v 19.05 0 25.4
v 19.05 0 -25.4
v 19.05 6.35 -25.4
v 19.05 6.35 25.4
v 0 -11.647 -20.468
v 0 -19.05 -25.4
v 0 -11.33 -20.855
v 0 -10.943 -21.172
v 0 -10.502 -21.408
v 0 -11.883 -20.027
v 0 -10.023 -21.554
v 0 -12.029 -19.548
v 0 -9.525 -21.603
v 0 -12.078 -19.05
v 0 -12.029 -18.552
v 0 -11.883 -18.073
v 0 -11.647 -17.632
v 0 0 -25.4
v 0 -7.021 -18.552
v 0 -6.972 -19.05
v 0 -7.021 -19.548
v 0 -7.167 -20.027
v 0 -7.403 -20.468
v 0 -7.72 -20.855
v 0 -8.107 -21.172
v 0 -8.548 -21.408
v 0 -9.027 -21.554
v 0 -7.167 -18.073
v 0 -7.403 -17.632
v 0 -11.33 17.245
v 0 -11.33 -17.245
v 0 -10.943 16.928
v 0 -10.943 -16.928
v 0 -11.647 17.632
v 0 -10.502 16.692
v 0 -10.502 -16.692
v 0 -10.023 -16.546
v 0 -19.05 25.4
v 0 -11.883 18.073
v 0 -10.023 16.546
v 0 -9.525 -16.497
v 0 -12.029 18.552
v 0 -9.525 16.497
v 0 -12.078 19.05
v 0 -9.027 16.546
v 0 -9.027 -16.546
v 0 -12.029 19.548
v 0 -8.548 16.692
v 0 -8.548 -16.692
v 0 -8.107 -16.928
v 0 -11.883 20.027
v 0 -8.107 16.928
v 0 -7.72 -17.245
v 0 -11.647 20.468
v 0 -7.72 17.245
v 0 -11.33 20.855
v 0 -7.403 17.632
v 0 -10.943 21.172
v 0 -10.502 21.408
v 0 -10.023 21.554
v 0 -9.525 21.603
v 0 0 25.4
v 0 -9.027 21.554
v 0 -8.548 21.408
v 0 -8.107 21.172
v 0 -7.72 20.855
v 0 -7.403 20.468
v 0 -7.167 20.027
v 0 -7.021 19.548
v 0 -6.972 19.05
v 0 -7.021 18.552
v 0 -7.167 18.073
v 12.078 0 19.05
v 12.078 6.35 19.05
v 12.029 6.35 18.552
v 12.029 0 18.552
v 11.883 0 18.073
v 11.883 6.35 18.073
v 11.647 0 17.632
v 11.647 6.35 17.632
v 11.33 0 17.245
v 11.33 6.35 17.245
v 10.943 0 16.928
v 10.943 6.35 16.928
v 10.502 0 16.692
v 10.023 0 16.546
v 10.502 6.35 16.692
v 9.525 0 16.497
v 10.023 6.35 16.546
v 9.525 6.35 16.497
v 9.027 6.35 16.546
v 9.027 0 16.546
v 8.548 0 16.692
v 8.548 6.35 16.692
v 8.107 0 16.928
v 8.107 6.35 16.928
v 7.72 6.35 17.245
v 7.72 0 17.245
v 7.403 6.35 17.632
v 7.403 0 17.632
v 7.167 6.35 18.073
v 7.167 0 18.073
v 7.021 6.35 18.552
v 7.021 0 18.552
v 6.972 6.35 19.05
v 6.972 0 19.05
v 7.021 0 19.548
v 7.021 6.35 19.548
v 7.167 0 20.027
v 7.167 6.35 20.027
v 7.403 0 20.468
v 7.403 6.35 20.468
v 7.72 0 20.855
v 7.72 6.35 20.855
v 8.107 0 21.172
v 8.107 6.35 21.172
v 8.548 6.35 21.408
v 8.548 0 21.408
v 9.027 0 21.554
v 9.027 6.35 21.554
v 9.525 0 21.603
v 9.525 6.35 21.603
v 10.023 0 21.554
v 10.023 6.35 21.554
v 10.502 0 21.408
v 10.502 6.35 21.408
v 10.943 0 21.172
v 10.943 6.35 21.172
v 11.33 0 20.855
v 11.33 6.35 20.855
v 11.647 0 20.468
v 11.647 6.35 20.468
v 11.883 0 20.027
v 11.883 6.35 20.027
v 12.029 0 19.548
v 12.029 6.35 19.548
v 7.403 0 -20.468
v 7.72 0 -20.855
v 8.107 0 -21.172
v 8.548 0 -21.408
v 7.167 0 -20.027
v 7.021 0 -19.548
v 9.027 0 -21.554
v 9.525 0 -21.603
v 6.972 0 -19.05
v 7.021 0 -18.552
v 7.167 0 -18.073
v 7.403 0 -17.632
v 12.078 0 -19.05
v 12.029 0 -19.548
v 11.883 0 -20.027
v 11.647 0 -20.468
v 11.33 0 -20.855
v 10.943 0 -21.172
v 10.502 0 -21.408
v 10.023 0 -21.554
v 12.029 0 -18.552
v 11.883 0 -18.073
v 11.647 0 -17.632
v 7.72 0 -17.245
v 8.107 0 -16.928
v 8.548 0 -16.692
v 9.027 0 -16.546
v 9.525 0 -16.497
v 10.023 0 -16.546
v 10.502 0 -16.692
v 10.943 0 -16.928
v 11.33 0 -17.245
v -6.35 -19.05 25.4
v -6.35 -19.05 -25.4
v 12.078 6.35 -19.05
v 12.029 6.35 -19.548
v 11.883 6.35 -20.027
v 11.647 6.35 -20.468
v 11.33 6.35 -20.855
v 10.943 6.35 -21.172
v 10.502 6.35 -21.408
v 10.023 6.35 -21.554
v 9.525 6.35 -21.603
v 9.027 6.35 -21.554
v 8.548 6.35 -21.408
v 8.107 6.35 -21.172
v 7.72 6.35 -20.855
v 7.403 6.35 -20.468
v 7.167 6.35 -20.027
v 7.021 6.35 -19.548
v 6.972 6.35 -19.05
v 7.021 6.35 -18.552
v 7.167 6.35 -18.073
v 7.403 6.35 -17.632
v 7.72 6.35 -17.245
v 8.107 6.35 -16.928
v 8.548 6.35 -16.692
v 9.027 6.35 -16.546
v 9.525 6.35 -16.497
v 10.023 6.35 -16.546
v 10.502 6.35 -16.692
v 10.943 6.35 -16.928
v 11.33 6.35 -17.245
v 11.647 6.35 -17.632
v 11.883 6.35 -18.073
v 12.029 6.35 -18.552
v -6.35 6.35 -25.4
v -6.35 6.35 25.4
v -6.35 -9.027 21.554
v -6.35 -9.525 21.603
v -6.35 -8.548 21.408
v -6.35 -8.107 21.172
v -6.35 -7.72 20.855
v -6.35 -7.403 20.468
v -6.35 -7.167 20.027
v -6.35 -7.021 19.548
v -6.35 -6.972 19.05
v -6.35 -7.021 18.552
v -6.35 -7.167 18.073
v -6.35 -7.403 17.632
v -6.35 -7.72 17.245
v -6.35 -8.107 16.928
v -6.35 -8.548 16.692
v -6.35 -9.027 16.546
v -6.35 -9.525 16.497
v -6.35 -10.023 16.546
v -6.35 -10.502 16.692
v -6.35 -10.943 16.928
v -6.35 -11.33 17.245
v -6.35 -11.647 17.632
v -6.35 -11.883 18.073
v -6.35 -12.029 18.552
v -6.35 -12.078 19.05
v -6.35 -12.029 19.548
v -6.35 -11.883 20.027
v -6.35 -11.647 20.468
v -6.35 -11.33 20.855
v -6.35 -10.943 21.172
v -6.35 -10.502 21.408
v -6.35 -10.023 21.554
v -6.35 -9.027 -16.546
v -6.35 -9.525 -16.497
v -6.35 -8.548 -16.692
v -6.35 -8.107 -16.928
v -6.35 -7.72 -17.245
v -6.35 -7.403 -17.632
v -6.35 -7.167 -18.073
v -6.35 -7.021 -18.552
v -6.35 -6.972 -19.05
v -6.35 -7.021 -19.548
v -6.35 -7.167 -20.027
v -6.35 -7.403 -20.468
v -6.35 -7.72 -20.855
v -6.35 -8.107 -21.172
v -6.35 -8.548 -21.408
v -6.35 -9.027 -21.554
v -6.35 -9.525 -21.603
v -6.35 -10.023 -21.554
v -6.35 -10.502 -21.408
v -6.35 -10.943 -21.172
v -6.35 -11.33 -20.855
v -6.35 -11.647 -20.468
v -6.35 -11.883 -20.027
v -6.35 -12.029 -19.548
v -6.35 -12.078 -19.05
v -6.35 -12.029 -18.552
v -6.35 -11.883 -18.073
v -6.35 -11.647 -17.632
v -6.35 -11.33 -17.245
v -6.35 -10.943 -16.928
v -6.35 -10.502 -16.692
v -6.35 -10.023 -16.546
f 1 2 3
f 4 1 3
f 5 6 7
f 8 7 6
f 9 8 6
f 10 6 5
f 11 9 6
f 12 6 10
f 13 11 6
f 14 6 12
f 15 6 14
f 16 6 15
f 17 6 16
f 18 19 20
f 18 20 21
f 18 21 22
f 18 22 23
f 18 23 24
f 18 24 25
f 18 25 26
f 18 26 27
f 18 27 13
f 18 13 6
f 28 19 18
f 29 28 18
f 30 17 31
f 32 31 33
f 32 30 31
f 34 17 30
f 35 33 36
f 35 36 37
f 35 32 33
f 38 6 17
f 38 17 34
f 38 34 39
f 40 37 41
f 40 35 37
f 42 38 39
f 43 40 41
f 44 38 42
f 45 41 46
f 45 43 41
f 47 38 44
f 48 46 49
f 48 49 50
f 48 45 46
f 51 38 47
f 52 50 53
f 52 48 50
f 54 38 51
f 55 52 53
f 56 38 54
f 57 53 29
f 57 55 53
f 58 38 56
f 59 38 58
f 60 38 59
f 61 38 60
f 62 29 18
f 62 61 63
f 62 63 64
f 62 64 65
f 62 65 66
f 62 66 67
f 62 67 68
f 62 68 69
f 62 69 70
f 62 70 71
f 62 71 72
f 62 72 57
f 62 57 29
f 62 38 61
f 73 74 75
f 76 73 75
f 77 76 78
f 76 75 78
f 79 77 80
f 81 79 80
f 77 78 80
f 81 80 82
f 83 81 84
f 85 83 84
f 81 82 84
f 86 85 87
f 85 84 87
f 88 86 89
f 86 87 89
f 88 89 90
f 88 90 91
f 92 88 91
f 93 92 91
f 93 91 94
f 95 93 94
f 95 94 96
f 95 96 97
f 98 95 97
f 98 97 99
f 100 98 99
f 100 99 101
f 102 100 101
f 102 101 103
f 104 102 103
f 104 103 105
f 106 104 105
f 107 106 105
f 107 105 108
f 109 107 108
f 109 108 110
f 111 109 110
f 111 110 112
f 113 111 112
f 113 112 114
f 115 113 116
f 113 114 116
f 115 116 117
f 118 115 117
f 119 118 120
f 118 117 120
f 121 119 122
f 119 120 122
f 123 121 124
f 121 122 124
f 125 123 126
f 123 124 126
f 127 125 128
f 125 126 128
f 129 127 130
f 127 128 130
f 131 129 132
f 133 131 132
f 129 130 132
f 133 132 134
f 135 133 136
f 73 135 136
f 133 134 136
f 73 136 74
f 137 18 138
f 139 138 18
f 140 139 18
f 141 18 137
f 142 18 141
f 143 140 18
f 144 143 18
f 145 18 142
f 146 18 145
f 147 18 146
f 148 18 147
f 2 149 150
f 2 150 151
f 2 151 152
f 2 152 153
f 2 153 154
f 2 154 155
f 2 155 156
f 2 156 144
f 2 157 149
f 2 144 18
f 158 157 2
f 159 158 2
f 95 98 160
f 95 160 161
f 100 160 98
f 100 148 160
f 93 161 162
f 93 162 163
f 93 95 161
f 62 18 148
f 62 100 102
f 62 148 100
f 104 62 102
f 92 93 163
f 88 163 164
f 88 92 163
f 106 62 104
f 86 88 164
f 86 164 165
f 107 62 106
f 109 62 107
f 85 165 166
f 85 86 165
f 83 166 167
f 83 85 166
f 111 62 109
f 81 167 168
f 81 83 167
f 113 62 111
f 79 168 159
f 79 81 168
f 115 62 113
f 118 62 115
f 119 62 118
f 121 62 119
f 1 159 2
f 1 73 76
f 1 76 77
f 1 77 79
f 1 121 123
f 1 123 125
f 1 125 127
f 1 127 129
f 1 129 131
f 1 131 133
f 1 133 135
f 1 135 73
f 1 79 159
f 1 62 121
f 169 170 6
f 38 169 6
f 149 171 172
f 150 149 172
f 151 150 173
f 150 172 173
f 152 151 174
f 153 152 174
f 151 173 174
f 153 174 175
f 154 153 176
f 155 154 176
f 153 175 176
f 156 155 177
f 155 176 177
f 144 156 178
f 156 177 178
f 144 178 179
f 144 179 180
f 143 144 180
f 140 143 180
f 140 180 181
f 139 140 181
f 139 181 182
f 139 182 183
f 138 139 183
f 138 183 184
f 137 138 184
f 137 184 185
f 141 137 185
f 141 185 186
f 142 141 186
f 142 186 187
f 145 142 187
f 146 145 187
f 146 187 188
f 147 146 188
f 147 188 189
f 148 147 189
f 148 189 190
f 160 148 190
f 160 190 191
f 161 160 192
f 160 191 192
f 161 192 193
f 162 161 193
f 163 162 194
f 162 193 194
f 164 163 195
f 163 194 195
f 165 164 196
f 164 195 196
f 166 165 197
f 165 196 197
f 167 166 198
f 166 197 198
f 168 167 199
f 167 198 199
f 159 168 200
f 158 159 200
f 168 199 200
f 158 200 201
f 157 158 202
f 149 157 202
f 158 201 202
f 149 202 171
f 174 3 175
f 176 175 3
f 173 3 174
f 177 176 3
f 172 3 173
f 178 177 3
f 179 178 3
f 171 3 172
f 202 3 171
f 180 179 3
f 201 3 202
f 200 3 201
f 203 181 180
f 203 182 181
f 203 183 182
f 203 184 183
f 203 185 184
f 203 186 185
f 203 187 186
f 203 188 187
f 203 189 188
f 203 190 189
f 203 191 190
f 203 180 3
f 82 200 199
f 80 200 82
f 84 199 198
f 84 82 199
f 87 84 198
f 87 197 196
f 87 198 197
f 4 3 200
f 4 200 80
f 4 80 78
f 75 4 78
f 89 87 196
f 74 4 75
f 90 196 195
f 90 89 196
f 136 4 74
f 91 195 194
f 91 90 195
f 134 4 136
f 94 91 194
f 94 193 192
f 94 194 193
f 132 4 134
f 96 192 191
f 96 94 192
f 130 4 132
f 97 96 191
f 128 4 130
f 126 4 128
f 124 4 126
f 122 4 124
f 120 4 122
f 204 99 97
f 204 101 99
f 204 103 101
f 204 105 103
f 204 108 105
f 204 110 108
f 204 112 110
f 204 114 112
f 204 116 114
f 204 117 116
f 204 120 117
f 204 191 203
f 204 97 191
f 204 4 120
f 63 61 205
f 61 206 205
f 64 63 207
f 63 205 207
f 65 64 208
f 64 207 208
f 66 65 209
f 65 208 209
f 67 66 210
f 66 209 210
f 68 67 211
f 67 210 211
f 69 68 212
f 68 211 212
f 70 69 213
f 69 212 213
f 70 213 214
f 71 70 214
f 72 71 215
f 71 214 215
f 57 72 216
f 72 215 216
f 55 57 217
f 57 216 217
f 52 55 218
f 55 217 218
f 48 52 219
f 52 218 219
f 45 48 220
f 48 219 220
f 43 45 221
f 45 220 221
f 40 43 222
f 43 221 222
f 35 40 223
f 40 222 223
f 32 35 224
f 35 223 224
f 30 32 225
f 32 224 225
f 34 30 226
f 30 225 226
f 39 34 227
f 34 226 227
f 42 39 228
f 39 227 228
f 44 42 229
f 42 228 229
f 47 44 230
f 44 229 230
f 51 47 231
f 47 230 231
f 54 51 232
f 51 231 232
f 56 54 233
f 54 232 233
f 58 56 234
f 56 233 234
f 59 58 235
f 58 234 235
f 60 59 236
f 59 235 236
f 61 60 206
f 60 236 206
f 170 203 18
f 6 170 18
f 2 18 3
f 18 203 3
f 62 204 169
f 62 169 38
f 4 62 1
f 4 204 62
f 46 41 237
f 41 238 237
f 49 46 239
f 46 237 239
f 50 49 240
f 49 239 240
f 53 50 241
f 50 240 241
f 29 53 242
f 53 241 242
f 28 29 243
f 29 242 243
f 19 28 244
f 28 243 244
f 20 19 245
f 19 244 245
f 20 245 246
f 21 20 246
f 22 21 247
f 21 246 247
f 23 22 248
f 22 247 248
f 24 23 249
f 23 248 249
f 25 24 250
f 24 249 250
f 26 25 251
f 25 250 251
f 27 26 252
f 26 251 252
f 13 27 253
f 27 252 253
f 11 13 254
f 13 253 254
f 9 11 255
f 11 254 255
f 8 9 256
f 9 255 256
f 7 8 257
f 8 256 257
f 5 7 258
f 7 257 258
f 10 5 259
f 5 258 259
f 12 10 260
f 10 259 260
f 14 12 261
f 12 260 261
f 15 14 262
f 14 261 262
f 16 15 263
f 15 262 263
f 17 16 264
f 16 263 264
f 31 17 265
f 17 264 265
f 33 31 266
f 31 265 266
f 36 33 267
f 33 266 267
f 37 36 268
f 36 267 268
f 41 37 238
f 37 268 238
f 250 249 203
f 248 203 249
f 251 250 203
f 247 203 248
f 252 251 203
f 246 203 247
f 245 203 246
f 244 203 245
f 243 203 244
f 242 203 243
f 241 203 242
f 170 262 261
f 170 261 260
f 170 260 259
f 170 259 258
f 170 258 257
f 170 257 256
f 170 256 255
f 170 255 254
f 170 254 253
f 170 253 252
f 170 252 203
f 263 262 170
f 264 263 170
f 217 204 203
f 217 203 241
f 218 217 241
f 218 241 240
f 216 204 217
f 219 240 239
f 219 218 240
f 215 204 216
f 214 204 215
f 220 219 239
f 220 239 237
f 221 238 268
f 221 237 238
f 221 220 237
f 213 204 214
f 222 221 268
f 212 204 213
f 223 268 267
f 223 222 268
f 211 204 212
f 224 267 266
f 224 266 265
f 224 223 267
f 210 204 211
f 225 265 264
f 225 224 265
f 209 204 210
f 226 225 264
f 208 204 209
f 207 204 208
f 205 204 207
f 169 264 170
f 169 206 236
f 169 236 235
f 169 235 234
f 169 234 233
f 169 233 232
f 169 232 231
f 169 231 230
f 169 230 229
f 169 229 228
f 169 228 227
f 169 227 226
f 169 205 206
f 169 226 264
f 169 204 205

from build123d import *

# Parameters (mm, degrees)
BOSS_EXTRUDE1_DEPTH        = 25.4
F_10_CLEARANCE_HOLE1_D     = 5.1054
F_10_CLEARANCE_HOLE2_D     = 5.1054
F_10_CLEARANCE_HOLE2_DEPTH = 6.35
F_10_CLEARANCE_HOLE2_TIP   = 1.533816902


with BuildPart() as part:
    # Sketch1 → Boss-Extrude1 (new, symmetric)
    with BuildSketch(Plane.XY):
        Polygon((0, 0), (19.05, 0), (19.05, 6.35), (-6.35, 6.35), (-6.35, -19.05), (0, -19.05), align=None)
    extrude(amount=BOSS_EXTRUDE1_DEPTH, both=True)

    # #10 Clearance Hole1 (through all)
    with Locations(Plane(origin=(0, 0, 0), x_dir=(-1, 0, 0), z_dir=(0, -1, 0))):
        with Locations((-9.525, -19.05), (-9.525, 19.05)):
            Hole(F_10_CLEARANCE_HOLE1_D / 2)

    # #10 Clearance Hole2
    with Locations(Plane(origin=(0, 0, 0), x_dir=(0, 0, -1), z_dir=(1, 0, 0))):
        with Locations((19.05, -9.525), (-19.05, -9.525)):
            Hole(F_10_CLEARANCE_HOLE2_D / 2, depth=F_10_CLEARANCE_HOLE2_DEPTH)
            with Locations((0, 0, -(F_10_CLEARANCE_HOLE2_DEPTH + F_10_CLEARANCE_HOLE2_TIP / 2))):  # 118° drill point
                Cone(0, F_10_CLEARANCE_HOLE2_D / 2, F_10_CLEARANCE_HOLE2_TIP, mode=Mode.SUBTRACT)


solid = part.part
